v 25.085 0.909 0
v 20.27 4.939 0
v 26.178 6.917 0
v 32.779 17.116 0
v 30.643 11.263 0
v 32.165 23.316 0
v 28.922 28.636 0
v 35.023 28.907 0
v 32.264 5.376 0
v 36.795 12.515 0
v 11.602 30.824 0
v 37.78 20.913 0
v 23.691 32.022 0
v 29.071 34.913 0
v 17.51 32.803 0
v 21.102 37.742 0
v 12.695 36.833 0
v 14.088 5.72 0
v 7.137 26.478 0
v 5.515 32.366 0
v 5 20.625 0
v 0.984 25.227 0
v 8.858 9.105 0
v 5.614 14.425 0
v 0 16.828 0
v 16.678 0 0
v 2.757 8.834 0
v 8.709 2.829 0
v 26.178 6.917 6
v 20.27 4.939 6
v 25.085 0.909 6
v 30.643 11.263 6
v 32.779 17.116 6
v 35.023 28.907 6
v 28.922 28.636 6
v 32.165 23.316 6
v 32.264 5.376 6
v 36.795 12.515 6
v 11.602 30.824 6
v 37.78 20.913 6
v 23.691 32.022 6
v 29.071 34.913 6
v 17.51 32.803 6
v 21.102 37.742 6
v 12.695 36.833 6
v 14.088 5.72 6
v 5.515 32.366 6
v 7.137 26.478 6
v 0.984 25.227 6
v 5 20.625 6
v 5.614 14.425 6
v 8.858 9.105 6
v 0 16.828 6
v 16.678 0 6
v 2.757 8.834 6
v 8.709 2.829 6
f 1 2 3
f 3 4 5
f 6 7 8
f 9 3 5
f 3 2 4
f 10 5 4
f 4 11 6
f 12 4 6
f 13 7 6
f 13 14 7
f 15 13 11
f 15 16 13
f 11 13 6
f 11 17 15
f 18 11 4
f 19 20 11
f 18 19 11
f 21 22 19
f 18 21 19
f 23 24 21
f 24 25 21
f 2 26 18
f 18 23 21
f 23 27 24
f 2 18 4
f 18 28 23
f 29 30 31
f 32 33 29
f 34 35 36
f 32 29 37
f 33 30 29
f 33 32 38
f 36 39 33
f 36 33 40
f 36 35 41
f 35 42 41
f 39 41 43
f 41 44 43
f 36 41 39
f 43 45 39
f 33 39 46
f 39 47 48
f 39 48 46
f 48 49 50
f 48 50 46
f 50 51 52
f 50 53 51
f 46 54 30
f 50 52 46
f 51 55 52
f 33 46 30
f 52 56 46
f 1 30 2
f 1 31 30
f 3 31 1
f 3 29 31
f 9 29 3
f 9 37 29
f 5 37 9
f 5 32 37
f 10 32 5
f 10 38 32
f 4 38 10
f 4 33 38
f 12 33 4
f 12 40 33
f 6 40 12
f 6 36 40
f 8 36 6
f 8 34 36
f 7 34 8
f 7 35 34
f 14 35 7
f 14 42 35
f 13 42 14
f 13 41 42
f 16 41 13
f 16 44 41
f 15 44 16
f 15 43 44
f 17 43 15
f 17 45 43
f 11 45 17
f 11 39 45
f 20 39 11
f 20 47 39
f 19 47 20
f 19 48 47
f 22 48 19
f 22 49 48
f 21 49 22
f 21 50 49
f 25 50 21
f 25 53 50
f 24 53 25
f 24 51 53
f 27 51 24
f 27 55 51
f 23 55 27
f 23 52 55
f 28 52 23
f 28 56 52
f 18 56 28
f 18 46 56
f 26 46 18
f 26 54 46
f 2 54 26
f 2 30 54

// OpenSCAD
$fn = 32;

// ----------------------------------------------------------------------
// Chain sprocket: 14 teeth, 14 mm root radius
// ----------------------------------------------------------------------

// --- parameters (mm) ---
profile_height = 6;       // extrusion height
profile_points = 28;      // points of the closed outline

profile = [[32.779, 17.116], [37.78, 20.913], [32.165, 23.316], [35.023, 28.907], [28.922, 28.636], [29.071, 34.913], [23.691, 32.022], [21.102, 37.742], [17.51, 32.803], [12.695, 36.833], [11.602, 30.824], [5.515, 32.366], [7.137, 26.478], [0.984, 25.227], [5, 20.625], [0, 16.828], [5.614, 14.425], [2.757, 8.834], [8.858, 9.105], [8.709, 2.829], [14.088, 5.72], [16.678, 0], [20.27, 4.939], [25.085, 0.909], [26.178, 6.917], [32.264, 5.376], [30.643, 11.263], [36.795, 12.515]];  // single closed polygon, 28 points, counter clockwise

// --- the one profile operation ---
linear_extrude(height = profile_height) polygon(points = profile);
